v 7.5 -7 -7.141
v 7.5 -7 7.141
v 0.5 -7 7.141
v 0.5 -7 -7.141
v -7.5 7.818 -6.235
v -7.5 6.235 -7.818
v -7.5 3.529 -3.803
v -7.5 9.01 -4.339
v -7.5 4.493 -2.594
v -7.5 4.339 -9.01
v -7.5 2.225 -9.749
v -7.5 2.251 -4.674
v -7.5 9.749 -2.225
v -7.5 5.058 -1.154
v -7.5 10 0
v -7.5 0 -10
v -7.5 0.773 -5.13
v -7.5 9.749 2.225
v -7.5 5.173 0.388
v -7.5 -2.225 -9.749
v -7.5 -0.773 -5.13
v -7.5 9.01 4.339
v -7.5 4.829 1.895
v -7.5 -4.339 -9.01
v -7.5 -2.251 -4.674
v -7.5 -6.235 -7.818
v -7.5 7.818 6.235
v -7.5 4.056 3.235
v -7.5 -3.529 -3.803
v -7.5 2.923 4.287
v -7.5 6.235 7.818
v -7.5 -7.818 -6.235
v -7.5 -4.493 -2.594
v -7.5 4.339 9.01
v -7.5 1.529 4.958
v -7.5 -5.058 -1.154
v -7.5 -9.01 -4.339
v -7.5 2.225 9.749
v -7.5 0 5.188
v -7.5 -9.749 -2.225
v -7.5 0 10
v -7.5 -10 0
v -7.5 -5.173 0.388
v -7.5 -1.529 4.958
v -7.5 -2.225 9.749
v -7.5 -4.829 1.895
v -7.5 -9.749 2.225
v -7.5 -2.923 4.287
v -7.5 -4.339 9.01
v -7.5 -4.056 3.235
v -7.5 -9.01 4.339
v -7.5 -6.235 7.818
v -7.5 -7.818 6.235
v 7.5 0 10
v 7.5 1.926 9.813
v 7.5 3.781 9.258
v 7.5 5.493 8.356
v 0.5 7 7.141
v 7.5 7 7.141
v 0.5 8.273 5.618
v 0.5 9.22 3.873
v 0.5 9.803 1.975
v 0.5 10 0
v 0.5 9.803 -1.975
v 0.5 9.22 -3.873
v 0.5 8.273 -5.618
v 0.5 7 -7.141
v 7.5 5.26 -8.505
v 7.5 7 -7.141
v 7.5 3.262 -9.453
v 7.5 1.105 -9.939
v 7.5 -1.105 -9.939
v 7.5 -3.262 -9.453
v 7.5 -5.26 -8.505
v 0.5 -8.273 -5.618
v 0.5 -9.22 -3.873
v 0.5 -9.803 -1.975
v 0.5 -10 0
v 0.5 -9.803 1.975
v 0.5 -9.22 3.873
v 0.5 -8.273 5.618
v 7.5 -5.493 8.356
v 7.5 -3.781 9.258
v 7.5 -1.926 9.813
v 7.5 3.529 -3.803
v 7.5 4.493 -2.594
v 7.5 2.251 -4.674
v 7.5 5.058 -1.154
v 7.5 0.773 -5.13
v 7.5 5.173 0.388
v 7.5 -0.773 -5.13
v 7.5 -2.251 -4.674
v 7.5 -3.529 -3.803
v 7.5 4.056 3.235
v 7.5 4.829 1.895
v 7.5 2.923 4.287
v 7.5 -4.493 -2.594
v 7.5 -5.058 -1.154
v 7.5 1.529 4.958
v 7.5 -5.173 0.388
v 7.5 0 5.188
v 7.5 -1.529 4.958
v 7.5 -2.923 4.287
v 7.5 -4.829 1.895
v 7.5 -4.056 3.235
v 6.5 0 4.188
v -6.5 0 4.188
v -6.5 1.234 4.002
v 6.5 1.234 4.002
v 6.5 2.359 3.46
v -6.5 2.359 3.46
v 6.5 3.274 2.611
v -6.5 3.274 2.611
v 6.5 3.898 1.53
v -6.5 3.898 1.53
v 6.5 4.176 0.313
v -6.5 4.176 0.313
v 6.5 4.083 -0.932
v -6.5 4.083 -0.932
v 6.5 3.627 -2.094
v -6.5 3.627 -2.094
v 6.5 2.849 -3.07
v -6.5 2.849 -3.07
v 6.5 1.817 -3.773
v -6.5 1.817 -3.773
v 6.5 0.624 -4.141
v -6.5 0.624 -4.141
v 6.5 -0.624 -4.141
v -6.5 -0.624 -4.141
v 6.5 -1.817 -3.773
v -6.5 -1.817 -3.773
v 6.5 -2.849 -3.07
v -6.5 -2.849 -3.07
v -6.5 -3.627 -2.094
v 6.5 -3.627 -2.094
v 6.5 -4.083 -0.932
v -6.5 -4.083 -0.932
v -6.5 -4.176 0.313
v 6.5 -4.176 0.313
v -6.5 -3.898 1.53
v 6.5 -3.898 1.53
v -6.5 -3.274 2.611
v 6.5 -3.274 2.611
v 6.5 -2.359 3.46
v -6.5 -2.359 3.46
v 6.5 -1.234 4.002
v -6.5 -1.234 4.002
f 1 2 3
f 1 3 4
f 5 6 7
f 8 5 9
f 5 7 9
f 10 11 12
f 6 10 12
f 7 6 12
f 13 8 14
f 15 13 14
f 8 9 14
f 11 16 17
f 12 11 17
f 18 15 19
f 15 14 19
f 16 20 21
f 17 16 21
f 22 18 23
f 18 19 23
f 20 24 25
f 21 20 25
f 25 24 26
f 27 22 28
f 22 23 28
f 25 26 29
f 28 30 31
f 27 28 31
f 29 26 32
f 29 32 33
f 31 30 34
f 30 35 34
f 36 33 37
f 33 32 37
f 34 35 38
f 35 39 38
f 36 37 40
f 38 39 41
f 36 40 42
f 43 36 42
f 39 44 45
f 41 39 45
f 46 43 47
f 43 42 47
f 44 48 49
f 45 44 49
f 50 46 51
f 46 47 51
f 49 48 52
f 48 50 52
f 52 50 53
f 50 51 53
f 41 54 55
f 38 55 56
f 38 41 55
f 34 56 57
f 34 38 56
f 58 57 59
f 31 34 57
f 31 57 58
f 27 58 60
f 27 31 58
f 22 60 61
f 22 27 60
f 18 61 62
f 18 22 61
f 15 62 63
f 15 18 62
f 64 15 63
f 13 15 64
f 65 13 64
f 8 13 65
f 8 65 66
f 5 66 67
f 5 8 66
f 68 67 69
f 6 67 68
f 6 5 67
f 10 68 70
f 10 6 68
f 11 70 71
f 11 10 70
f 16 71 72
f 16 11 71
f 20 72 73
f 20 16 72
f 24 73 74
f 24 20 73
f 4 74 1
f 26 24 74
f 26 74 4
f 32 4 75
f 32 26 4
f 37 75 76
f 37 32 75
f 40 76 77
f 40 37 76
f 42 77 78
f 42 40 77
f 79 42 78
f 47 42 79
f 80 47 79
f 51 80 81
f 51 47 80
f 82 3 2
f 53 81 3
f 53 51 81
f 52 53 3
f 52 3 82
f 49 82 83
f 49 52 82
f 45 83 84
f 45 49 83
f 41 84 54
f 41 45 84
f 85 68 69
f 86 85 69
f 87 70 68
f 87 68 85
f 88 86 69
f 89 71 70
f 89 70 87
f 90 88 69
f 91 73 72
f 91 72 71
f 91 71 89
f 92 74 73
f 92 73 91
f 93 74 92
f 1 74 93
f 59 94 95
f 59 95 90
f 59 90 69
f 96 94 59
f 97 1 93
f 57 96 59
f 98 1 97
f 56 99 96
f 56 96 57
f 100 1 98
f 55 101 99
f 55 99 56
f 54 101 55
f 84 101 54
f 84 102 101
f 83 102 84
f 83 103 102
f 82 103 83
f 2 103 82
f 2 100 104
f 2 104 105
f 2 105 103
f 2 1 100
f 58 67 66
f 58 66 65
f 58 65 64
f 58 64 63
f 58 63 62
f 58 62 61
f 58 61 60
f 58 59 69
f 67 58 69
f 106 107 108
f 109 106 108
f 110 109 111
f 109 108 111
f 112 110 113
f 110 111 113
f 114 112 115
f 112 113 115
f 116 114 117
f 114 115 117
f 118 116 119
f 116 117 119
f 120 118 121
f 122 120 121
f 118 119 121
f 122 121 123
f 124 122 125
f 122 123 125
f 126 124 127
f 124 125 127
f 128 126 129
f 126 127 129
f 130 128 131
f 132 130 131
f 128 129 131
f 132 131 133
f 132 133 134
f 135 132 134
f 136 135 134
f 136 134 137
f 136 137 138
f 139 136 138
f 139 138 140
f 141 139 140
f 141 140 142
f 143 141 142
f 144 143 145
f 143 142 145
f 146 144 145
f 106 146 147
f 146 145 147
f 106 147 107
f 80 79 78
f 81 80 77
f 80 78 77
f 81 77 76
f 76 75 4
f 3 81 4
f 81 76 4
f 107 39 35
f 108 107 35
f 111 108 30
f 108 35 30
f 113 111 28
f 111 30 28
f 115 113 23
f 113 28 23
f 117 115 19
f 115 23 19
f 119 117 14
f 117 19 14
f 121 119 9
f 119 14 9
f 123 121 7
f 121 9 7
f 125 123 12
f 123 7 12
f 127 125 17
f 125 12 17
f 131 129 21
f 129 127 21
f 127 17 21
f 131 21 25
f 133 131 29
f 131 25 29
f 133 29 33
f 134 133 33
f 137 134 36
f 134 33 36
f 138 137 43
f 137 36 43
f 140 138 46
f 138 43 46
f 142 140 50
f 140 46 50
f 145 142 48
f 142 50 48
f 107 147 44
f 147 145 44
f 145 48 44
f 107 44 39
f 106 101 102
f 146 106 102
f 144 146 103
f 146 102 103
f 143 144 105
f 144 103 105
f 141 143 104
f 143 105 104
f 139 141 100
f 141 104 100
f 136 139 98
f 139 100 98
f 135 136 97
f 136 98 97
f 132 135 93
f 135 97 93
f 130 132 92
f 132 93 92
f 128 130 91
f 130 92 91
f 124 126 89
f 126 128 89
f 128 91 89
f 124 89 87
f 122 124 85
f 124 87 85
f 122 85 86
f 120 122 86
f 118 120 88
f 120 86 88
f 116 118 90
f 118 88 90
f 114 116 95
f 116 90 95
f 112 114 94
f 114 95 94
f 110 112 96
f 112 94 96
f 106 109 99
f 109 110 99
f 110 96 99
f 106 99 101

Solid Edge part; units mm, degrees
sketch "Sketch1" plane through (0, 0, 0) normal (0, -1, 0) x (1, 0, 0)
  line L0 (7.5, 0) -> (7.5, 10)
  line L1 (7.5, 10) -> (-7.5, 10)
  line L2 (-7.5, 10) -> (-7.5, 0)
  line L3 (-7.5, 0) -> (7.5, 0)
revolve "RevolvedProtrusion1" add sketch "Sketch1" angle 360 about axis through (-15, 0, 0) along (1, 0, 0)
sketch "Sketch2" plane through (7.5, 0, 0) normal (1, 0, 0) x (0, 1, 0)
  line L0 (-7, 7.1414) -> (-7, -7.1414)
  arc A0 (-7, -7.1414) -> (-7, 7.1414) centre (0, 0) cw
  line L1 (7, 7.1414) -> (7, -7.1414)
  arc A1 (7, 7.1414) -> (7, -7.1414) centre (0, 0) cw
extrude "VaciadoExtruido_1" cut sketch "Sketch2" against normal blind 7
hole "Agujero_1" at (-7.5, 0, 0) direction (1, 0, 0) diameter 8.376 end up to next start chamfer 1 start chamfer angle 45 end chamfer 1 end chamfer angle 45
